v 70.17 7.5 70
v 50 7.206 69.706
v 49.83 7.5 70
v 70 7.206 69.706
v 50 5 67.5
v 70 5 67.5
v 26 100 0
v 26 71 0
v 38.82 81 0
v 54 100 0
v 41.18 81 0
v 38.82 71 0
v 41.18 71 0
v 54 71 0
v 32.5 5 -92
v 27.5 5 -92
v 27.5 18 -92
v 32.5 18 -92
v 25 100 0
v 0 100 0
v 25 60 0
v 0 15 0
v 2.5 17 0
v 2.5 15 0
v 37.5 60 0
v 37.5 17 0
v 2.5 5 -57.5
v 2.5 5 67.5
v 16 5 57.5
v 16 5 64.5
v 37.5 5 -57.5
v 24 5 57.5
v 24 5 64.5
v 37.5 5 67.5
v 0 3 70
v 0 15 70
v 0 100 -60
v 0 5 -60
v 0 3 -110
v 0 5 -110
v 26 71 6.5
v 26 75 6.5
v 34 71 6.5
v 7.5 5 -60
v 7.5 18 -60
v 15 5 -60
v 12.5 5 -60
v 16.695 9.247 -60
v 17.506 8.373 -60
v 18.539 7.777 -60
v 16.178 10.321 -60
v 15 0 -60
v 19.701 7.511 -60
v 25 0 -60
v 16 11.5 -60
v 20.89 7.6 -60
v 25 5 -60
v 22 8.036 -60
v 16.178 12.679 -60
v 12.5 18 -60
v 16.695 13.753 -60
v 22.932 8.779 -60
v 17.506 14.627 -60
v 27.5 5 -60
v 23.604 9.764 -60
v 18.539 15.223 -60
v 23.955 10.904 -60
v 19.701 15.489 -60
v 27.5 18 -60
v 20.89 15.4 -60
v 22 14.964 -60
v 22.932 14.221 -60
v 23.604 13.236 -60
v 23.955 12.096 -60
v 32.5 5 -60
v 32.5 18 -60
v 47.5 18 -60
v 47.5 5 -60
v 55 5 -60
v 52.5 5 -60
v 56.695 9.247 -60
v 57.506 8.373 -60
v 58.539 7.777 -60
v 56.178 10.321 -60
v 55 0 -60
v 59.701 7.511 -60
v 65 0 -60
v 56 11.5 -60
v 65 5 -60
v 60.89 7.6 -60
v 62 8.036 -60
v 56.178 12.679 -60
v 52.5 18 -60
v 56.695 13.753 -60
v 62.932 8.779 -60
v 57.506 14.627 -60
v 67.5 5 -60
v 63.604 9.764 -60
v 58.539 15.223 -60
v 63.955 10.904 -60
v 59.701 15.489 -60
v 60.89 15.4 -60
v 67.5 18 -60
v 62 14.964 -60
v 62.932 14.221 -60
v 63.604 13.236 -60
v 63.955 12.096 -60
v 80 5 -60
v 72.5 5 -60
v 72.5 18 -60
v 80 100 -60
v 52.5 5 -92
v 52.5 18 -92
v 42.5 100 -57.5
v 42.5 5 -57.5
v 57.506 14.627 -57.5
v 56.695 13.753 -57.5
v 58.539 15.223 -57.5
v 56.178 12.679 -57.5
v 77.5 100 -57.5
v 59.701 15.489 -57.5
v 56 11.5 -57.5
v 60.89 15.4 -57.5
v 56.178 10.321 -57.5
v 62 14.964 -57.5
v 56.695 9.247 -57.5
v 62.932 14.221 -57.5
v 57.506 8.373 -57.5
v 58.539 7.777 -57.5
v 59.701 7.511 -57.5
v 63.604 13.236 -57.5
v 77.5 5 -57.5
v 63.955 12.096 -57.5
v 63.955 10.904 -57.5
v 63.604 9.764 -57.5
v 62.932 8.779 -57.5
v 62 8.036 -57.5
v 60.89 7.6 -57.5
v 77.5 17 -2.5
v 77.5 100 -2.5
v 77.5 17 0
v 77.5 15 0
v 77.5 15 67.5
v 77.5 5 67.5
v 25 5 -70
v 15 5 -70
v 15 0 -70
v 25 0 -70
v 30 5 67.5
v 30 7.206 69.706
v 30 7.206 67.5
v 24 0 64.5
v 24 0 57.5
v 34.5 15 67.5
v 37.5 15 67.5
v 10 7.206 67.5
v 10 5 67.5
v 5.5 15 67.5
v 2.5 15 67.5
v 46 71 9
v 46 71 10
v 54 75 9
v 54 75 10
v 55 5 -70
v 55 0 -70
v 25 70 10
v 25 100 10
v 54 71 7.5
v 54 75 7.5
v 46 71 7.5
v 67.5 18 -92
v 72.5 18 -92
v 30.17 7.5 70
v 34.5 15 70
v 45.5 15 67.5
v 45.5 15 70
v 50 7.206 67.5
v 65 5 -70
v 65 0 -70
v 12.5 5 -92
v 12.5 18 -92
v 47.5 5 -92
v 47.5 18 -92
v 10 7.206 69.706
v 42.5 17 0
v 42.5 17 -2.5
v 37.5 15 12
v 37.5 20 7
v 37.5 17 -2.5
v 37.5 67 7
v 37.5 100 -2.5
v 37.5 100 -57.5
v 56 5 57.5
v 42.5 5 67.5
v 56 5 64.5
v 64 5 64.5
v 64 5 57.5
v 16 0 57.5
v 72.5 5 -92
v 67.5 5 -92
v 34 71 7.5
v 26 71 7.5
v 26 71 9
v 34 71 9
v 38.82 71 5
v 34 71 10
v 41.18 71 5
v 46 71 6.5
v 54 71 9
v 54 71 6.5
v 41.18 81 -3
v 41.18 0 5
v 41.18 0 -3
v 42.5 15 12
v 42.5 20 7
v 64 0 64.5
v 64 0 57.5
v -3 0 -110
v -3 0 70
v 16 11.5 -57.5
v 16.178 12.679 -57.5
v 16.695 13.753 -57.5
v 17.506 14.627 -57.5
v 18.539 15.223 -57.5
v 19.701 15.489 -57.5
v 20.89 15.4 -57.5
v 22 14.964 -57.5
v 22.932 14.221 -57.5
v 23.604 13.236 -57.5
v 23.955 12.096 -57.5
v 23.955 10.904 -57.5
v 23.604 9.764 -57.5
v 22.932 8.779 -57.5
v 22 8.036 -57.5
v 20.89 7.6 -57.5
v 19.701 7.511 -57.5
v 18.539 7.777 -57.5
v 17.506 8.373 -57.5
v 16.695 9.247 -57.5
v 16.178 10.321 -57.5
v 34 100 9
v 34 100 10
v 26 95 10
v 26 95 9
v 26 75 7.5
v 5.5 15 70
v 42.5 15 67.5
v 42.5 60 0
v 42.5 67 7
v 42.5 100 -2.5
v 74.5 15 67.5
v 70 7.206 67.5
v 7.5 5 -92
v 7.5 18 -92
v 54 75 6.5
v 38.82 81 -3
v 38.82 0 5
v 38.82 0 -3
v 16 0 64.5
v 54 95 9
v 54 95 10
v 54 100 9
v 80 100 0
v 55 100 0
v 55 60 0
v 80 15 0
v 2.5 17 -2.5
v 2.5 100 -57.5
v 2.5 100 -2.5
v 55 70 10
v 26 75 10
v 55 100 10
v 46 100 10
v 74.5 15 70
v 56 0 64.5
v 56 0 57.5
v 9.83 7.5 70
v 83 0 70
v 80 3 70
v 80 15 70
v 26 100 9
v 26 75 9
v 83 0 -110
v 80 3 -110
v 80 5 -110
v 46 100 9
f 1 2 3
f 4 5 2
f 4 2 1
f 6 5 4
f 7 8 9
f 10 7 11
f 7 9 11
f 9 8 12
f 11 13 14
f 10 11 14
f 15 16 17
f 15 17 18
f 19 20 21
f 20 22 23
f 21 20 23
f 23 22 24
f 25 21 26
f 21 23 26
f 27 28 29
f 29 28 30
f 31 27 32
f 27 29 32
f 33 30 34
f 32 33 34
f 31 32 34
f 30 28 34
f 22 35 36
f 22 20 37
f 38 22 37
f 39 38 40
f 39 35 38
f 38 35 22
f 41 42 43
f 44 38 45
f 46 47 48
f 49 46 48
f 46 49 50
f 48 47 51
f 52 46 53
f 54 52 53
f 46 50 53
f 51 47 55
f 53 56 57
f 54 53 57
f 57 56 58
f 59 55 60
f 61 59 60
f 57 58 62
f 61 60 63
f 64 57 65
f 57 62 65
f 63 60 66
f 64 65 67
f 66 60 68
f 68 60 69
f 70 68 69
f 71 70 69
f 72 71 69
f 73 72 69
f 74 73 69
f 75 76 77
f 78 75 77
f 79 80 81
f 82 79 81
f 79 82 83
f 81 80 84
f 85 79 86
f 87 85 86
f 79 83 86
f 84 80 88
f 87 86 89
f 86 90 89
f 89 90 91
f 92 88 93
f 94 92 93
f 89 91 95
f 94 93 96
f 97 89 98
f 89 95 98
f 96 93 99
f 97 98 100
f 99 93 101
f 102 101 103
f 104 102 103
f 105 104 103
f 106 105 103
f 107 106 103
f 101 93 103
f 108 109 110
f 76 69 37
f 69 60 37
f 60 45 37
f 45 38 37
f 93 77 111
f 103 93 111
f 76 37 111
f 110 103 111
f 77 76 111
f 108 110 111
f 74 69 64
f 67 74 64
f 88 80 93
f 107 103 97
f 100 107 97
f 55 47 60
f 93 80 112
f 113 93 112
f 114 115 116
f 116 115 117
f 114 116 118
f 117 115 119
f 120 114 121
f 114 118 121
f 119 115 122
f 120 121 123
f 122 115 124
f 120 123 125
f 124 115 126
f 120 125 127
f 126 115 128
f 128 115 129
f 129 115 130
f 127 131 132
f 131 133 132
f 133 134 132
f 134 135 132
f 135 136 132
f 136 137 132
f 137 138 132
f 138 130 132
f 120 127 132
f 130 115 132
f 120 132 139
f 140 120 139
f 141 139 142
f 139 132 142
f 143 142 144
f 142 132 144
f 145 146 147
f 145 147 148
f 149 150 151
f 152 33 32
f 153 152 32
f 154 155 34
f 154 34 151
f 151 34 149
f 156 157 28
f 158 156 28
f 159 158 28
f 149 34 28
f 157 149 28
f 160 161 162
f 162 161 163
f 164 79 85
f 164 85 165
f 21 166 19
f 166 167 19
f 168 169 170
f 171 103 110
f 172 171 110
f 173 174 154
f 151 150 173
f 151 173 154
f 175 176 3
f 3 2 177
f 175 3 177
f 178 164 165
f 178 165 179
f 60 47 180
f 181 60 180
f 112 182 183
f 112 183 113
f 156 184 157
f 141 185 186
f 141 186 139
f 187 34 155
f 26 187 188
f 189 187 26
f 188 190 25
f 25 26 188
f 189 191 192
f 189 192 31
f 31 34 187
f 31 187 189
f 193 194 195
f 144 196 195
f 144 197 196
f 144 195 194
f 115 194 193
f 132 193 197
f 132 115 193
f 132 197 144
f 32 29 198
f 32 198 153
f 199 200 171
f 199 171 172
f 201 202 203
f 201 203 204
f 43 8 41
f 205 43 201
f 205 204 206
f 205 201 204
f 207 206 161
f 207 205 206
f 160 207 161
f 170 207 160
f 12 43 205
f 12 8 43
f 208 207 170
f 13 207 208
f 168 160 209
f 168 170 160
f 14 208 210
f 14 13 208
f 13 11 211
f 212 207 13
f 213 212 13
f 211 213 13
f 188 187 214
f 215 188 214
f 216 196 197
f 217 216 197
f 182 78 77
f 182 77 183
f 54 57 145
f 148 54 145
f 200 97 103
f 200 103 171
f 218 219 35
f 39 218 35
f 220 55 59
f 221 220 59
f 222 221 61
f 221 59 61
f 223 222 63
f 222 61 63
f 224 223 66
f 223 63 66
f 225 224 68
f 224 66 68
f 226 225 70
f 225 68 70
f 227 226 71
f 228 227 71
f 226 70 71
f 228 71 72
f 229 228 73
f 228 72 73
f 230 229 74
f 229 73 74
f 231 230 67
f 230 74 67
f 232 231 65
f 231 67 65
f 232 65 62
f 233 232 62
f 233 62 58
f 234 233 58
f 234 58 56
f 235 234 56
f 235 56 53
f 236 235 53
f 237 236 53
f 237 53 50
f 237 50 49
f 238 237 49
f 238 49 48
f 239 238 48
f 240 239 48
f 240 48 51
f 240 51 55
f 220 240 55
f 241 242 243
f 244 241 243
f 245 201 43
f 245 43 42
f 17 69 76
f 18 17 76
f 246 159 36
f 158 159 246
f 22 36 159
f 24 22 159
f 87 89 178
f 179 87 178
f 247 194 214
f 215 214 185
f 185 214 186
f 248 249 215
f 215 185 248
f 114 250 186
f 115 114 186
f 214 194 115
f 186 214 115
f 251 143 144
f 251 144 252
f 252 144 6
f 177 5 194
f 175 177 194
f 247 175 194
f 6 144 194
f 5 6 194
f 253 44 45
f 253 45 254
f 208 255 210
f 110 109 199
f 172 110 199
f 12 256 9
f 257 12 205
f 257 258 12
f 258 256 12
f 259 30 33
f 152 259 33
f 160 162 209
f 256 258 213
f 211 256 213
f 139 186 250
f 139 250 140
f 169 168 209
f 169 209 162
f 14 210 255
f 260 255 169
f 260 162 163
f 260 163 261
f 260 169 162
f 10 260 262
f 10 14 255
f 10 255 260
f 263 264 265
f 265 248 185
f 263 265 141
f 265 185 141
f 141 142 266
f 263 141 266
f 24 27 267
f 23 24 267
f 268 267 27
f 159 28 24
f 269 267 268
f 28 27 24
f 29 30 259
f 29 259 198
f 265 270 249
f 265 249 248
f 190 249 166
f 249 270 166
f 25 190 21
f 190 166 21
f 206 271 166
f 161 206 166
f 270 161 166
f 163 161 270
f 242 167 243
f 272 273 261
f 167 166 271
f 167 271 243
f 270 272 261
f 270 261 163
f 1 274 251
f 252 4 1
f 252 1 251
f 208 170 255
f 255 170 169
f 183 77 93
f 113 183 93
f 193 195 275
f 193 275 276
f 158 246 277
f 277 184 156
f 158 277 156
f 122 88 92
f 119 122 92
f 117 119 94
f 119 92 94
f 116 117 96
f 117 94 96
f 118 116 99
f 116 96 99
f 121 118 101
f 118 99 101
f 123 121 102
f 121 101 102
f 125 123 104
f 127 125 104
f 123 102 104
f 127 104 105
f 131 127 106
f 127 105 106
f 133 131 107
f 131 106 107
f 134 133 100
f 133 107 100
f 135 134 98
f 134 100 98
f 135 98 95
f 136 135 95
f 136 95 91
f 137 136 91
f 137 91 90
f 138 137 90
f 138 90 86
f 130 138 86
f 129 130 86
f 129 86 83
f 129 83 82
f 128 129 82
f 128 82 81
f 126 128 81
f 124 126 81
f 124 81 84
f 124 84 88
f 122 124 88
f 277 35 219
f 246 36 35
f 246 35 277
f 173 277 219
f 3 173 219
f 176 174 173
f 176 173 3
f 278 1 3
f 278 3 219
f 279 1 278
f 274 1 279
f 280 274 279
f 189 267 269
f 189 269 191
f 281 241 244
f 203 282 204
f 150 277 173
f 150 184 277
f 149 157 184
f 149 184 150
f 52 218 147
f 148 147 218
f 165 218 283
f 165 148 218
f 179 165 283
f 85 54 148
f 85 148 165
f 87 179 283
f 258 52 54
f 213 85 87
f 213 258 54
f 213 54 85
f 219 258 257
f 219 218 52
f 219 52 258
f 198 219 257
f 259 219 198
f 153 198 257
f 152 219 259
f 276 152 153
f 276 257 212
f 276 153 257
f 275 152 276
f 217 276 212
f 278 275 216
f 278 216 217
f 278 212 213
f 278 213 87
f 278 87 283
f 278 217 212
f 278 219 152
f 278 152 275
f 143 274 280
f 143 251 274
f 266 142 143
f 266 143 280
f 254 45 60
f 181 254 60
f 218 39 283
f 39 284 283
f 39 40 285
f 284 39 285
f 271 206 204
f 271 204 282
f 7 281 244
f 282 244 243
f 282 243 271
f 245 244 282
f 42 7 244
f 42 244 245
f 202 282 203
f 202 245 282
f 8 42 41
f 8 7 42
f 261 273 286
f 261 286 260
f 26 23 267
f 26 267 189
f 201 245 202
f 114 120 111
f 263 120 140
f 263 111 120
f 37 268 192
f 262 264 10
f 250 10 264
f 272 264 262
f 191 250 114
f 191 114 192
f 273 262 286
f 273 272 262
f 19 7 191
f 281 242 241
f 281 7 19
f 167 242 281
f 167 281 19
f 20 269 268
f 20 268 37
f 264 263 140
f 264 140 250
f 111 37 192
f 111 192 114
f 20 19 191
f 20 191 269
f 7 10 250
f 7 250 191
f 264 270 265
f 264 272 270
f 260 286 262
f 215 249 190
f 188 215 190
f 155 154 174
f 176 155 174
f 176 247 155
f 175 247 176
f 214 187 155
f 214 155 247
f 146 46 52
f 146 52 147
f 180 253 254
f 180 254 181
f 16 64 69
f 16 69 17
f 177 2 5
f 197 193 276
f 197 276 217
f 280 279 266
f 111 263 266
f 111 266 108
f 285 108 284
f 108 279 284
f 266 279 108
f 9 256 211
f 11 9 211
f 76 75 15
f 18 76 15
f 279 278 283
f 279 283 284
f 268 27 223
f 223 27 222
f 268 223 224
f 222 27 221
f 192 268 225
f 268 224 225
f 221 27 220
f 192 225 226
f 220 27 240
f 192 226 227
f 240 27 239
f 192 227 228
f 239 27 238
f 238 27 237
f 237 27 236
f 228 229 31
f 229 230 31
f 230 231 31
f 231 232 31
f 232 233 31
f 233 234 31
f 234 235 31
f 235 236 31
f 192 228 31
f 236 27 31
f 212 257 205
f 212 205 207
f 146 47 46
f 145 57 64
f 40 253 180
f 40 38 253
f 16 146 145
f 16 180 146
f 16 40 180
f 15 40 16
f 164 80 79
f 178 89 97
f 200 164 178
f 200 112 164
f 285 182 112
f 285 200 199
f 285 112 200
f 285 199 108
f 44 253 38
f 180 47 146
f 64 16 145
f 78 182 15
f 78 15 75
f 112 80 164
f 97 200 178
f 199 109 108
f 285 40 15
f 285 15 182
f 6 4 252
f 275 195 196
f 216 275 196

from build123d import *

# Parameters (mm, degrees)
SKETCH1_W                                 = 80
SKETCH1_H                                 = 60
BOSS_EXTRUDE1_DEPTH                       = 100
CUT_EXTRUDE1_START                        = 5
SKETCH2_W                                 = 35
SKETCH2_H                                 = 55
CUT_EXTRUDE1_DEPTH                        = 95
SKETCH3_W                                 = 80
SKETCH3_H                                 = 5
BOSS_EXTRUDE2_DEPTH                       = 70
BOSS_EXTRUDE3_DEPTH                       = 10
SKETCH5_W                                 = 20
SKETCH5_H                                 = 2.5
CUT_EXTRUDE2_DEPTH                        = 7.5
SKETCH6_W                                 = 35
SKETCH6_H                                 = 12
CUT_EXTRUDE4_DEPTH                        = 57.5
CUT_EXTRUDE6_REACH                        = 184.483
SKETCH7_R                                 = 4
SKETCH9_W                                 = 80
SKETCH9_H                                 = 50
BOSS_EXTRUDE4_DEPTH                       = 5
SKETCH13_W                                = 8
SKETCH13_H                                = 7
CUT_EXTRUDE8_BUTTON_HOLES_DEPTH           = 166.90660023
BOSS_EXTRUDE5_OLED_MOUNT_DEPTH            = 10
BOSS_EXTRUDE6_OLED_MOUNT_DEPTH            = 1
BOSS_EXTRUDE7_START                       = -2.5
BOSS_EXTRUDE7_OLED_MOUNT_DEPTH            = 1
BOSS_EXTRUDE8_OLED_MOUNT_DEPTH            = 1
BOSS_EXTRUDE13_OLED_MOUNT_SUPPORT_DEPTH   = 30
CUT_EXTRUDE9_OLED_CABLE_DEPTH             = 10
CUT_EXTRUDE9_OLED_CABLE_DEPTH_BACK        = 154.430766146
SKETCH18_W                                = 2.36
SKETCH18_H                                = 8
BOSS_EXTRUDE12_OLED_CABLE_GUIDE_REACH     = 162.39
SKETCH20_W                                = 10
SKETCH20_H                                = 10
CUT_EXTRUDE10_SOLENOID_WIRE_HOLE_DEPTH    = 166.90660023
SKETCH21_W                                = 5
SKETCH21_H                                = 32
BOSS_EXTRUDE9_SOLENOID_SIDE_SUPPORT_DEPTH = 13
CHAMFER3_THUMB_SIZE                       = 2.5
CHAMFER5_THUMB_SIZE                       = 4.5
CHAMFER5_THUMB_SIZE2                      = 7.794228634
CHAMFER5_THUMB_PART_2_SIZE                = 4.5
CHAMFER5_THUMB_PART_2_SIZE2               = 7.794228634
CHAMFER5_THUMB_PART_3_SIZE                = 4.5
CHAMFER5_THUMB_PART_3_SIZE2               = 7.794228634
BOSS_EXTRUDE5_GUIDE_DEPTH                 = 180
SKETCH49_W                                = 5
SKETCH49_H                                = 5
BOSS_EXTRUDE14_DEPTH                      = 5
CHAMFER8_SIZE                             = 5


with BuildPart() as part:
    # Sketch1 → Boss-Extrude1 (new body)
    with BuildSketch(Plane(origin=(0, 0, 0), x_dir=(1, 0, 0), z_dir=(0, 1, 0))):
        with Locations((40, 30)):
            Rectangle(SKETCH1_W, SKETCH1_H)
    extrude(amount=BOSS_EXTRUDE1_DEPTH)

    # Sketch2 → Cut-Extrude1 (cut)
    with BuildSketch(Plane(origin=(0, 0, 0), x_dir=(1, 0, 0), z_dir=(0, 1, 0)).offset(CUT_EXTRUDE1_START)):
        with Locations((20, 30)):
            Rectangle(SKETCH2_W, SKETCH2_H)
        with Locations((60, 30)):
            Rectangle(SKETCH2_W, SKETCH2_H)
    extrude(amount=CUT_EXTRUDE1_DEPTH, mode=Mode.SUBTRACT)

    # Sketch3 → Boss-Extrude2 (add)
    with BuildSketch(Plane.XY):
        with Locations((40, 2.5)):
            Rectangle(SKETCH3_W, SKETCH3_H)
    extrude(amount=BOSS_EXTRUDE2_DEPTH)

    # Sketch4 → Boss-Extrude3 (add)
    with BuildSketch(Plane(origin=(0, 5, 0), x_dir=(1, 0, 0), z_dir=(0, 1, 0))):
        Polygon((80, 0), (77.5, 0), (77.5, -67.5), (42.5, -67.5), (42.5, 0), (37.5, 0), (37.5, -67.5), (2.5, -67.5), (2.5, 0), (0, 0), (0, -70), (80, -70), align=None)
    extrude(amount=BOSS_EXTRUDE3_DEPTH)

    # Sketch5 → Cut-Extrude2 (cut)
    with BuildSketch(Plane(origin=(0, 15, 0), x_dir=(1, 0, 0), z_dir=(0, 1, 0))):
        with Locations((20, -68.75)):
            Rectangle(SKETCH5_W, SKETCH5_H)
        with Locations((60, -68.75)):
            Rectangle(SKETCH5_W, SKETCH5_H)
    extrude(amount=-CUT_EXTRUDE2_DEPTH, mode=Mode.SUBTRACT)

    # Sketch6 → Cut-Extrude4 (cut)
    with BuildSketch(Plane.XY):
        with Locations((20, 11)):
            Rectangle(SKETCH6_W, SKETCH6_H)
        with Locations((60, 11)):
            Rectangle(SKETCH6_W, SKETCH6_H)
    extrude(amount=-CUT_EXTRUDE4_DEPTH, mode=Mode.SUBTRACT)

    # Sketch7 → Cut-Extrude6 (cut, up to next)
    with BuildSketch(Plane(origin=(0, 0, -60), x_dir=(-1, 0, 0), z_dir=(0, 0, -1)), mode=Mode.PRIVATE) as cut_extrude6_sk1:
        with Locations((-20, 11.5)):
            Circle(SKETCH7_R)
    cut_extrude6_tool1 = extrude(cut_extrude6_sk1.sketch, amount=-CUT_EXTRUDE6_REACH, mode=Mode.PRIVATE) & part.part
    # Sketch7 → Cut-Extrude6 (cut, up to next)
    with BuildSketch(Plane(origin=(0, 0, -60), x_dir=(-1, 0, 0), z_dir=(0, 0, -1)), mode=Mode.PRIVATE) as cut_extrude6_sk2:
        with Locations((-60, 11.5)):
            Circle(SKETCH7_R)
    cut_extrude6_tool2 = extrude(cut_extrude6_sk2.sketch, amount=-CUT_EXTRUDE6_REACH, mode=Mode.PRIVATE) & part.part
    add(cut_extrude6_tool1.solids().sort_by_distance((20, 11.5, -60))[0], mode=Mode.SUBTRACT)
    add(cut_extrude6_tool2.solids().sort_by_distance((60, 11.5, -60))[0], mode=Mode.SUBTRACT)

    # Sketch9 → Boss-Extrude4 (add)
    with BuildSketch(Plane(origin=(0, 0, 0), x_dir=(1, 0, 0), z_dir=(0, 1, 0))):
        with Locations((40, 85)):
            Rectangle(SKETCH9_W, SKETCH9_H)
    extrude(amount=BOSS_EXTRUDE4_DEPTH)

    # Sketch13 → Cut-Extrude8 (Button Holes) (cut, through all)
    with BuildSketch(Plane(origin=(0, 5, 0), x_dir=(1, 0, 0), z_dir=(0, 1, 0))):
        with Locations((20, -61)):
            Rectangle(SKETCH13_W, SKETCH13_H)
        with Locations((60, -61)):
            Rectangle(SKETCH13_W, SKETCH13_H)
    extrude(amount=-CUT_EXTRUDE8_BUTTON_HOLES_DEPTH, mode=Mode.SUBTRACT)

    # Sketch14 → Boss-Extrude5 (OLED Mount) (add)
    with BuildSketch(Plane.XY):
        Polygon((25, 100), (26, 100), (26, 71), (54, 71), (54, 100), (55, 100), (55, 70), (54, 70), (26, 70), (25, 70), align=None)
    extrude(amount=BOSS_EXTRUDE5_OLED_MOUNT_DEPTH)

    # Sketch15 → Boss-Extrude6 (OLED Mount) (add)
    with BuildSketch(Plane.XY.offset(10)):
        Polygon((26, 71), (34, 71), (26, 75), align=None)
        Polygon((54, 75), (54, 71), (46, 71), align=None)
    extrude(amount=-BOSS_EXTRUDE6_OLED_MOUNT_DEPTH)

    # Sketch15<2> → Boss-Extrude7 (OLED Mount) (add)
    with BuildSketch(Plane.XY.offset(10).offset(BOSS_EXTRUDE7_START)):
        Polygon((26, 71), (34, 71), (26, 75), align=None)
        Polygon((54, 75), (54, 71), (46, 71), align=None)
    extrude(amount=-BOSS_EXTRUDE7_OLED_MOUNT_DEPTH)

    # Sketch17 → Boss-Extrude8 (OLED Mount) (add)
    with BuildSketch(Plane.XY.offset(10)):
        Polygon((54, 95), (54, 100), (46, 100), align=None)
        Polygon((26, 100), (34, 100), (26, 95), align=None)
    extrude(amount=-BOSS_EXTRUDE8_OLED_MOUNT_DEPTH)

    # Sketch32 → Boss-Extrude13 OLED Mount Support) (add)
    with BuildSketch(Plane.ZY.offset(-25)):
        Polygon((0, 70), (10, 70), (0, 60), align=None)
    extrude(amount=-BOSS_EXTRUDE13_OLED_MOUNT_SUPPORT_DEPTH)

    # Sketch18 → Cut-Extrude9 (OLED Cable) (cut, two sides: drawn at the far end of the back side and taken through both)
    with BuildSketch(Plane(origin=(0, 71, 0), x_dir=(1, 0, 0), z_dir=(0, 1, 0)).offset(-CUT_EXTRUDE9_OLED_CABLE_DEPTH_BACK)):
        with Locations((40, -1)):
            Rectangle(SKETCH18_W, SKETCH18_H)
    extrude(amount=CUT_EXTRUDE9_OLED_CABLE_DEPTH + CUT_EXTRUDE9_OLED_CABLE_DEPTH_BACK, mode=Mode.SUBTRACT)

    # Boss-Extrude12 (OLED Cable Guide): up to this plane
    boss_extrude12_oled_cable_guide_end = Plane(origin=(55, 70, 10), z_dir=(0, -0.7071067811865477, 0.7071067811865474))
    # Sketch31 → Boss-Extrude12 (OLED Cable Guide) (add, up to the surface)
    with BuildSketch(Plane(origin=(0, 15, 0), x_dir=(1, 0, 0), z_dir=(0, 1, 0)), mode=Mode.PRIVATE) as boss_extrude12_oled_cable_guide_sk1:
        Polygon((37.5, 0), (38.82, 0), (38.82, -5), (41.18, -5), (41.18, 0), (42.5, 0), (42.5, -7), (37.5, -7), align=None)
    boss_extrude12_oled_cable_guide_tool1 = split(extrude(boss_extrude12_oled_cable_guide_sk1.sketch, amount=BOSS_EXTRUDE12_OLED_CABLE_GUIDE_REACH, mode=Mode.PRIVATE), bisect_by=boss_extrude12_oled_cable_guide_end, keep=Keep.BOTH, mode=Mode.PRIVATE)
    add(boss_extrude12_oled_cable_guide_tool1.solids().sort_by_distance((38.16, 15, 0.086023))[0])

    # Sketch20 → Cut-Extrude10 (Solenoid Wire Hole) (cut, through all)
    with BuildSketch(Plane(origin=(0, 5, 0), x_dir=(1, 0, 0), z_dir=(0, 1, 0))):
        with Locations((60, 65)):
            Rectangle(SKETCH20_W, SKETCH20_H)
        with Locations((20, 65)):
            Rectangle(SKETCH20_W, SKETCH20_H)
    extrude(amount=-CUT_EXTRUDE10_SOLENOID_WIRE_HOLE_DEPTH, mode=Mode.SUBTRACT)

    # Sketch21 → Boss-Extrude9 (Solenoid Side Support) (add)
    with BuildSketch(Plane(origin=(0, 5, 0), x_dir=(1, 0, 0), z_dir=(0, 1, 0))):
        with Locations((70, 76)):
            Rectangle(SKETCH21_W, SKETCH21_H)
        with Locations((50, 76)):
            Rectangle(SKETCH21_W, SKETCH21_H)
        with Locations((30, 76)):
            Rectangle(SKETCH21_W, SKETCH21_H)
        with Locations((10, 76)):
            Rectangle(SKETCH21_W, SKETCH21_H)
    extrude(amount=BOSS_EXTRUDE9_SOLENOID_SIDE_SUPPORT_DEPTH)

    # Chamfer3 (Thumb)
    chamfer3_thumb_edges = [part.edges().sort_by_distance(p)[0] for p in [
        (20, 7.5, 67.5),
        (60, 7.5, 67.5),
    ]]
    chamfer(chamfer3_thumb_edges, length=CHAMFER3_THUMB_SIZE - 0.0001)  # a hair under: the kernel refuses the full size

    # Chamfer5 (Thumb)
    chamfer5_thumb_edges = [part.edges().sort_by_distance(p)[0] for p in [
        (70, 15, 68.75),
    ]]
    chamfer5_thumb_side = [part.faces().sort_by_distance(p)[0] for p in [
        (78.266129032, 15, 38.266129032),
    ]]
    chamfer(chamfer5_thumb_edges, length=CHAMFER5_THUMB_SIZE, length2=CHAMFER5_THUMB_SIZE2, reference=chamfer5_thumb_side[0])

    # Chamfer5 (Thumb) part 2
    chamfer5_thumb_part_2_edges = [part.edges().sort_by_distance(p)[0] for p in [
        (50, 15, 68.75),
        (30, 15, 68.75),
    ]]
    chamfer5_thumb_part_2_side = [part.faces().sort_by_distance(p)[0] for p in [
        (40, 15, 41.718085106),
    ]]
    chamfer(chamfer5_thumb_part_2_edges, length=CHAMFER5_THUMB_PART_2_SIZE, length2=CHAMFER5_THUMB_PART_2_SIZE2, reference=chamfer5_thumb_part_2_side[0])

    # Chamfer5 (Thumb) part 3
    chamfer5_thumb_part_3_edges = [part.edges().sort_by_distance(p)[0] for p in [
        (10, 15, 68.75),
    ]]
    chamfer5_thumb_part_3_side = [part.faces().sort_by_distance(p)[0] for p in [
        (1.733870968, 15, 38.266129032),
    ]]
    chamfer(chamfer5_thumb_part_3_edges, length=CHAMFER5_THUMB_PART_3_SIZE, length2=CHAMFER5_THUMB_PART_3_SIZE2, reference=chamfer5_thumb_part_3_side[0])

    # Sketch37 → Boss-Extrude5 (Guide) (add, through all)
    with BuildSketch(Plane.XY.offset(70)):
        Polygon((80, 0), (83, 0), (80, 3), align=None)
        Polygon((0, 0), (-3, 0), (0, 3), align=None)
    extrude(amount=-BOSS_EXTRUDE5_GUIDE_DEPTH)

    # Sketch49 → Boss-Extrude14 (add)
    with BuildSketch(Plane(origin=(0, 15, 0), x_dir=(1, 0, 0), z_dir=(0, 1, 0))):
        with Locations((40, -9.5)):
            Rectangle(SKETCH49_W, SKETCH49_H)
    extrude(amount=BOSS_EXTRUDE14_DEPTH)

    # Chamfer8
    chamfer8_edges = [part.edges().sort_by_distance(p)[0] for p in [
        (40, 20, 12),
    ]]
    chamfer(chamfer8_edges, length=CHAMFER8_SIZE - 0.0001)  # a hair under: the kernel refuses the full size


solid = part.part
